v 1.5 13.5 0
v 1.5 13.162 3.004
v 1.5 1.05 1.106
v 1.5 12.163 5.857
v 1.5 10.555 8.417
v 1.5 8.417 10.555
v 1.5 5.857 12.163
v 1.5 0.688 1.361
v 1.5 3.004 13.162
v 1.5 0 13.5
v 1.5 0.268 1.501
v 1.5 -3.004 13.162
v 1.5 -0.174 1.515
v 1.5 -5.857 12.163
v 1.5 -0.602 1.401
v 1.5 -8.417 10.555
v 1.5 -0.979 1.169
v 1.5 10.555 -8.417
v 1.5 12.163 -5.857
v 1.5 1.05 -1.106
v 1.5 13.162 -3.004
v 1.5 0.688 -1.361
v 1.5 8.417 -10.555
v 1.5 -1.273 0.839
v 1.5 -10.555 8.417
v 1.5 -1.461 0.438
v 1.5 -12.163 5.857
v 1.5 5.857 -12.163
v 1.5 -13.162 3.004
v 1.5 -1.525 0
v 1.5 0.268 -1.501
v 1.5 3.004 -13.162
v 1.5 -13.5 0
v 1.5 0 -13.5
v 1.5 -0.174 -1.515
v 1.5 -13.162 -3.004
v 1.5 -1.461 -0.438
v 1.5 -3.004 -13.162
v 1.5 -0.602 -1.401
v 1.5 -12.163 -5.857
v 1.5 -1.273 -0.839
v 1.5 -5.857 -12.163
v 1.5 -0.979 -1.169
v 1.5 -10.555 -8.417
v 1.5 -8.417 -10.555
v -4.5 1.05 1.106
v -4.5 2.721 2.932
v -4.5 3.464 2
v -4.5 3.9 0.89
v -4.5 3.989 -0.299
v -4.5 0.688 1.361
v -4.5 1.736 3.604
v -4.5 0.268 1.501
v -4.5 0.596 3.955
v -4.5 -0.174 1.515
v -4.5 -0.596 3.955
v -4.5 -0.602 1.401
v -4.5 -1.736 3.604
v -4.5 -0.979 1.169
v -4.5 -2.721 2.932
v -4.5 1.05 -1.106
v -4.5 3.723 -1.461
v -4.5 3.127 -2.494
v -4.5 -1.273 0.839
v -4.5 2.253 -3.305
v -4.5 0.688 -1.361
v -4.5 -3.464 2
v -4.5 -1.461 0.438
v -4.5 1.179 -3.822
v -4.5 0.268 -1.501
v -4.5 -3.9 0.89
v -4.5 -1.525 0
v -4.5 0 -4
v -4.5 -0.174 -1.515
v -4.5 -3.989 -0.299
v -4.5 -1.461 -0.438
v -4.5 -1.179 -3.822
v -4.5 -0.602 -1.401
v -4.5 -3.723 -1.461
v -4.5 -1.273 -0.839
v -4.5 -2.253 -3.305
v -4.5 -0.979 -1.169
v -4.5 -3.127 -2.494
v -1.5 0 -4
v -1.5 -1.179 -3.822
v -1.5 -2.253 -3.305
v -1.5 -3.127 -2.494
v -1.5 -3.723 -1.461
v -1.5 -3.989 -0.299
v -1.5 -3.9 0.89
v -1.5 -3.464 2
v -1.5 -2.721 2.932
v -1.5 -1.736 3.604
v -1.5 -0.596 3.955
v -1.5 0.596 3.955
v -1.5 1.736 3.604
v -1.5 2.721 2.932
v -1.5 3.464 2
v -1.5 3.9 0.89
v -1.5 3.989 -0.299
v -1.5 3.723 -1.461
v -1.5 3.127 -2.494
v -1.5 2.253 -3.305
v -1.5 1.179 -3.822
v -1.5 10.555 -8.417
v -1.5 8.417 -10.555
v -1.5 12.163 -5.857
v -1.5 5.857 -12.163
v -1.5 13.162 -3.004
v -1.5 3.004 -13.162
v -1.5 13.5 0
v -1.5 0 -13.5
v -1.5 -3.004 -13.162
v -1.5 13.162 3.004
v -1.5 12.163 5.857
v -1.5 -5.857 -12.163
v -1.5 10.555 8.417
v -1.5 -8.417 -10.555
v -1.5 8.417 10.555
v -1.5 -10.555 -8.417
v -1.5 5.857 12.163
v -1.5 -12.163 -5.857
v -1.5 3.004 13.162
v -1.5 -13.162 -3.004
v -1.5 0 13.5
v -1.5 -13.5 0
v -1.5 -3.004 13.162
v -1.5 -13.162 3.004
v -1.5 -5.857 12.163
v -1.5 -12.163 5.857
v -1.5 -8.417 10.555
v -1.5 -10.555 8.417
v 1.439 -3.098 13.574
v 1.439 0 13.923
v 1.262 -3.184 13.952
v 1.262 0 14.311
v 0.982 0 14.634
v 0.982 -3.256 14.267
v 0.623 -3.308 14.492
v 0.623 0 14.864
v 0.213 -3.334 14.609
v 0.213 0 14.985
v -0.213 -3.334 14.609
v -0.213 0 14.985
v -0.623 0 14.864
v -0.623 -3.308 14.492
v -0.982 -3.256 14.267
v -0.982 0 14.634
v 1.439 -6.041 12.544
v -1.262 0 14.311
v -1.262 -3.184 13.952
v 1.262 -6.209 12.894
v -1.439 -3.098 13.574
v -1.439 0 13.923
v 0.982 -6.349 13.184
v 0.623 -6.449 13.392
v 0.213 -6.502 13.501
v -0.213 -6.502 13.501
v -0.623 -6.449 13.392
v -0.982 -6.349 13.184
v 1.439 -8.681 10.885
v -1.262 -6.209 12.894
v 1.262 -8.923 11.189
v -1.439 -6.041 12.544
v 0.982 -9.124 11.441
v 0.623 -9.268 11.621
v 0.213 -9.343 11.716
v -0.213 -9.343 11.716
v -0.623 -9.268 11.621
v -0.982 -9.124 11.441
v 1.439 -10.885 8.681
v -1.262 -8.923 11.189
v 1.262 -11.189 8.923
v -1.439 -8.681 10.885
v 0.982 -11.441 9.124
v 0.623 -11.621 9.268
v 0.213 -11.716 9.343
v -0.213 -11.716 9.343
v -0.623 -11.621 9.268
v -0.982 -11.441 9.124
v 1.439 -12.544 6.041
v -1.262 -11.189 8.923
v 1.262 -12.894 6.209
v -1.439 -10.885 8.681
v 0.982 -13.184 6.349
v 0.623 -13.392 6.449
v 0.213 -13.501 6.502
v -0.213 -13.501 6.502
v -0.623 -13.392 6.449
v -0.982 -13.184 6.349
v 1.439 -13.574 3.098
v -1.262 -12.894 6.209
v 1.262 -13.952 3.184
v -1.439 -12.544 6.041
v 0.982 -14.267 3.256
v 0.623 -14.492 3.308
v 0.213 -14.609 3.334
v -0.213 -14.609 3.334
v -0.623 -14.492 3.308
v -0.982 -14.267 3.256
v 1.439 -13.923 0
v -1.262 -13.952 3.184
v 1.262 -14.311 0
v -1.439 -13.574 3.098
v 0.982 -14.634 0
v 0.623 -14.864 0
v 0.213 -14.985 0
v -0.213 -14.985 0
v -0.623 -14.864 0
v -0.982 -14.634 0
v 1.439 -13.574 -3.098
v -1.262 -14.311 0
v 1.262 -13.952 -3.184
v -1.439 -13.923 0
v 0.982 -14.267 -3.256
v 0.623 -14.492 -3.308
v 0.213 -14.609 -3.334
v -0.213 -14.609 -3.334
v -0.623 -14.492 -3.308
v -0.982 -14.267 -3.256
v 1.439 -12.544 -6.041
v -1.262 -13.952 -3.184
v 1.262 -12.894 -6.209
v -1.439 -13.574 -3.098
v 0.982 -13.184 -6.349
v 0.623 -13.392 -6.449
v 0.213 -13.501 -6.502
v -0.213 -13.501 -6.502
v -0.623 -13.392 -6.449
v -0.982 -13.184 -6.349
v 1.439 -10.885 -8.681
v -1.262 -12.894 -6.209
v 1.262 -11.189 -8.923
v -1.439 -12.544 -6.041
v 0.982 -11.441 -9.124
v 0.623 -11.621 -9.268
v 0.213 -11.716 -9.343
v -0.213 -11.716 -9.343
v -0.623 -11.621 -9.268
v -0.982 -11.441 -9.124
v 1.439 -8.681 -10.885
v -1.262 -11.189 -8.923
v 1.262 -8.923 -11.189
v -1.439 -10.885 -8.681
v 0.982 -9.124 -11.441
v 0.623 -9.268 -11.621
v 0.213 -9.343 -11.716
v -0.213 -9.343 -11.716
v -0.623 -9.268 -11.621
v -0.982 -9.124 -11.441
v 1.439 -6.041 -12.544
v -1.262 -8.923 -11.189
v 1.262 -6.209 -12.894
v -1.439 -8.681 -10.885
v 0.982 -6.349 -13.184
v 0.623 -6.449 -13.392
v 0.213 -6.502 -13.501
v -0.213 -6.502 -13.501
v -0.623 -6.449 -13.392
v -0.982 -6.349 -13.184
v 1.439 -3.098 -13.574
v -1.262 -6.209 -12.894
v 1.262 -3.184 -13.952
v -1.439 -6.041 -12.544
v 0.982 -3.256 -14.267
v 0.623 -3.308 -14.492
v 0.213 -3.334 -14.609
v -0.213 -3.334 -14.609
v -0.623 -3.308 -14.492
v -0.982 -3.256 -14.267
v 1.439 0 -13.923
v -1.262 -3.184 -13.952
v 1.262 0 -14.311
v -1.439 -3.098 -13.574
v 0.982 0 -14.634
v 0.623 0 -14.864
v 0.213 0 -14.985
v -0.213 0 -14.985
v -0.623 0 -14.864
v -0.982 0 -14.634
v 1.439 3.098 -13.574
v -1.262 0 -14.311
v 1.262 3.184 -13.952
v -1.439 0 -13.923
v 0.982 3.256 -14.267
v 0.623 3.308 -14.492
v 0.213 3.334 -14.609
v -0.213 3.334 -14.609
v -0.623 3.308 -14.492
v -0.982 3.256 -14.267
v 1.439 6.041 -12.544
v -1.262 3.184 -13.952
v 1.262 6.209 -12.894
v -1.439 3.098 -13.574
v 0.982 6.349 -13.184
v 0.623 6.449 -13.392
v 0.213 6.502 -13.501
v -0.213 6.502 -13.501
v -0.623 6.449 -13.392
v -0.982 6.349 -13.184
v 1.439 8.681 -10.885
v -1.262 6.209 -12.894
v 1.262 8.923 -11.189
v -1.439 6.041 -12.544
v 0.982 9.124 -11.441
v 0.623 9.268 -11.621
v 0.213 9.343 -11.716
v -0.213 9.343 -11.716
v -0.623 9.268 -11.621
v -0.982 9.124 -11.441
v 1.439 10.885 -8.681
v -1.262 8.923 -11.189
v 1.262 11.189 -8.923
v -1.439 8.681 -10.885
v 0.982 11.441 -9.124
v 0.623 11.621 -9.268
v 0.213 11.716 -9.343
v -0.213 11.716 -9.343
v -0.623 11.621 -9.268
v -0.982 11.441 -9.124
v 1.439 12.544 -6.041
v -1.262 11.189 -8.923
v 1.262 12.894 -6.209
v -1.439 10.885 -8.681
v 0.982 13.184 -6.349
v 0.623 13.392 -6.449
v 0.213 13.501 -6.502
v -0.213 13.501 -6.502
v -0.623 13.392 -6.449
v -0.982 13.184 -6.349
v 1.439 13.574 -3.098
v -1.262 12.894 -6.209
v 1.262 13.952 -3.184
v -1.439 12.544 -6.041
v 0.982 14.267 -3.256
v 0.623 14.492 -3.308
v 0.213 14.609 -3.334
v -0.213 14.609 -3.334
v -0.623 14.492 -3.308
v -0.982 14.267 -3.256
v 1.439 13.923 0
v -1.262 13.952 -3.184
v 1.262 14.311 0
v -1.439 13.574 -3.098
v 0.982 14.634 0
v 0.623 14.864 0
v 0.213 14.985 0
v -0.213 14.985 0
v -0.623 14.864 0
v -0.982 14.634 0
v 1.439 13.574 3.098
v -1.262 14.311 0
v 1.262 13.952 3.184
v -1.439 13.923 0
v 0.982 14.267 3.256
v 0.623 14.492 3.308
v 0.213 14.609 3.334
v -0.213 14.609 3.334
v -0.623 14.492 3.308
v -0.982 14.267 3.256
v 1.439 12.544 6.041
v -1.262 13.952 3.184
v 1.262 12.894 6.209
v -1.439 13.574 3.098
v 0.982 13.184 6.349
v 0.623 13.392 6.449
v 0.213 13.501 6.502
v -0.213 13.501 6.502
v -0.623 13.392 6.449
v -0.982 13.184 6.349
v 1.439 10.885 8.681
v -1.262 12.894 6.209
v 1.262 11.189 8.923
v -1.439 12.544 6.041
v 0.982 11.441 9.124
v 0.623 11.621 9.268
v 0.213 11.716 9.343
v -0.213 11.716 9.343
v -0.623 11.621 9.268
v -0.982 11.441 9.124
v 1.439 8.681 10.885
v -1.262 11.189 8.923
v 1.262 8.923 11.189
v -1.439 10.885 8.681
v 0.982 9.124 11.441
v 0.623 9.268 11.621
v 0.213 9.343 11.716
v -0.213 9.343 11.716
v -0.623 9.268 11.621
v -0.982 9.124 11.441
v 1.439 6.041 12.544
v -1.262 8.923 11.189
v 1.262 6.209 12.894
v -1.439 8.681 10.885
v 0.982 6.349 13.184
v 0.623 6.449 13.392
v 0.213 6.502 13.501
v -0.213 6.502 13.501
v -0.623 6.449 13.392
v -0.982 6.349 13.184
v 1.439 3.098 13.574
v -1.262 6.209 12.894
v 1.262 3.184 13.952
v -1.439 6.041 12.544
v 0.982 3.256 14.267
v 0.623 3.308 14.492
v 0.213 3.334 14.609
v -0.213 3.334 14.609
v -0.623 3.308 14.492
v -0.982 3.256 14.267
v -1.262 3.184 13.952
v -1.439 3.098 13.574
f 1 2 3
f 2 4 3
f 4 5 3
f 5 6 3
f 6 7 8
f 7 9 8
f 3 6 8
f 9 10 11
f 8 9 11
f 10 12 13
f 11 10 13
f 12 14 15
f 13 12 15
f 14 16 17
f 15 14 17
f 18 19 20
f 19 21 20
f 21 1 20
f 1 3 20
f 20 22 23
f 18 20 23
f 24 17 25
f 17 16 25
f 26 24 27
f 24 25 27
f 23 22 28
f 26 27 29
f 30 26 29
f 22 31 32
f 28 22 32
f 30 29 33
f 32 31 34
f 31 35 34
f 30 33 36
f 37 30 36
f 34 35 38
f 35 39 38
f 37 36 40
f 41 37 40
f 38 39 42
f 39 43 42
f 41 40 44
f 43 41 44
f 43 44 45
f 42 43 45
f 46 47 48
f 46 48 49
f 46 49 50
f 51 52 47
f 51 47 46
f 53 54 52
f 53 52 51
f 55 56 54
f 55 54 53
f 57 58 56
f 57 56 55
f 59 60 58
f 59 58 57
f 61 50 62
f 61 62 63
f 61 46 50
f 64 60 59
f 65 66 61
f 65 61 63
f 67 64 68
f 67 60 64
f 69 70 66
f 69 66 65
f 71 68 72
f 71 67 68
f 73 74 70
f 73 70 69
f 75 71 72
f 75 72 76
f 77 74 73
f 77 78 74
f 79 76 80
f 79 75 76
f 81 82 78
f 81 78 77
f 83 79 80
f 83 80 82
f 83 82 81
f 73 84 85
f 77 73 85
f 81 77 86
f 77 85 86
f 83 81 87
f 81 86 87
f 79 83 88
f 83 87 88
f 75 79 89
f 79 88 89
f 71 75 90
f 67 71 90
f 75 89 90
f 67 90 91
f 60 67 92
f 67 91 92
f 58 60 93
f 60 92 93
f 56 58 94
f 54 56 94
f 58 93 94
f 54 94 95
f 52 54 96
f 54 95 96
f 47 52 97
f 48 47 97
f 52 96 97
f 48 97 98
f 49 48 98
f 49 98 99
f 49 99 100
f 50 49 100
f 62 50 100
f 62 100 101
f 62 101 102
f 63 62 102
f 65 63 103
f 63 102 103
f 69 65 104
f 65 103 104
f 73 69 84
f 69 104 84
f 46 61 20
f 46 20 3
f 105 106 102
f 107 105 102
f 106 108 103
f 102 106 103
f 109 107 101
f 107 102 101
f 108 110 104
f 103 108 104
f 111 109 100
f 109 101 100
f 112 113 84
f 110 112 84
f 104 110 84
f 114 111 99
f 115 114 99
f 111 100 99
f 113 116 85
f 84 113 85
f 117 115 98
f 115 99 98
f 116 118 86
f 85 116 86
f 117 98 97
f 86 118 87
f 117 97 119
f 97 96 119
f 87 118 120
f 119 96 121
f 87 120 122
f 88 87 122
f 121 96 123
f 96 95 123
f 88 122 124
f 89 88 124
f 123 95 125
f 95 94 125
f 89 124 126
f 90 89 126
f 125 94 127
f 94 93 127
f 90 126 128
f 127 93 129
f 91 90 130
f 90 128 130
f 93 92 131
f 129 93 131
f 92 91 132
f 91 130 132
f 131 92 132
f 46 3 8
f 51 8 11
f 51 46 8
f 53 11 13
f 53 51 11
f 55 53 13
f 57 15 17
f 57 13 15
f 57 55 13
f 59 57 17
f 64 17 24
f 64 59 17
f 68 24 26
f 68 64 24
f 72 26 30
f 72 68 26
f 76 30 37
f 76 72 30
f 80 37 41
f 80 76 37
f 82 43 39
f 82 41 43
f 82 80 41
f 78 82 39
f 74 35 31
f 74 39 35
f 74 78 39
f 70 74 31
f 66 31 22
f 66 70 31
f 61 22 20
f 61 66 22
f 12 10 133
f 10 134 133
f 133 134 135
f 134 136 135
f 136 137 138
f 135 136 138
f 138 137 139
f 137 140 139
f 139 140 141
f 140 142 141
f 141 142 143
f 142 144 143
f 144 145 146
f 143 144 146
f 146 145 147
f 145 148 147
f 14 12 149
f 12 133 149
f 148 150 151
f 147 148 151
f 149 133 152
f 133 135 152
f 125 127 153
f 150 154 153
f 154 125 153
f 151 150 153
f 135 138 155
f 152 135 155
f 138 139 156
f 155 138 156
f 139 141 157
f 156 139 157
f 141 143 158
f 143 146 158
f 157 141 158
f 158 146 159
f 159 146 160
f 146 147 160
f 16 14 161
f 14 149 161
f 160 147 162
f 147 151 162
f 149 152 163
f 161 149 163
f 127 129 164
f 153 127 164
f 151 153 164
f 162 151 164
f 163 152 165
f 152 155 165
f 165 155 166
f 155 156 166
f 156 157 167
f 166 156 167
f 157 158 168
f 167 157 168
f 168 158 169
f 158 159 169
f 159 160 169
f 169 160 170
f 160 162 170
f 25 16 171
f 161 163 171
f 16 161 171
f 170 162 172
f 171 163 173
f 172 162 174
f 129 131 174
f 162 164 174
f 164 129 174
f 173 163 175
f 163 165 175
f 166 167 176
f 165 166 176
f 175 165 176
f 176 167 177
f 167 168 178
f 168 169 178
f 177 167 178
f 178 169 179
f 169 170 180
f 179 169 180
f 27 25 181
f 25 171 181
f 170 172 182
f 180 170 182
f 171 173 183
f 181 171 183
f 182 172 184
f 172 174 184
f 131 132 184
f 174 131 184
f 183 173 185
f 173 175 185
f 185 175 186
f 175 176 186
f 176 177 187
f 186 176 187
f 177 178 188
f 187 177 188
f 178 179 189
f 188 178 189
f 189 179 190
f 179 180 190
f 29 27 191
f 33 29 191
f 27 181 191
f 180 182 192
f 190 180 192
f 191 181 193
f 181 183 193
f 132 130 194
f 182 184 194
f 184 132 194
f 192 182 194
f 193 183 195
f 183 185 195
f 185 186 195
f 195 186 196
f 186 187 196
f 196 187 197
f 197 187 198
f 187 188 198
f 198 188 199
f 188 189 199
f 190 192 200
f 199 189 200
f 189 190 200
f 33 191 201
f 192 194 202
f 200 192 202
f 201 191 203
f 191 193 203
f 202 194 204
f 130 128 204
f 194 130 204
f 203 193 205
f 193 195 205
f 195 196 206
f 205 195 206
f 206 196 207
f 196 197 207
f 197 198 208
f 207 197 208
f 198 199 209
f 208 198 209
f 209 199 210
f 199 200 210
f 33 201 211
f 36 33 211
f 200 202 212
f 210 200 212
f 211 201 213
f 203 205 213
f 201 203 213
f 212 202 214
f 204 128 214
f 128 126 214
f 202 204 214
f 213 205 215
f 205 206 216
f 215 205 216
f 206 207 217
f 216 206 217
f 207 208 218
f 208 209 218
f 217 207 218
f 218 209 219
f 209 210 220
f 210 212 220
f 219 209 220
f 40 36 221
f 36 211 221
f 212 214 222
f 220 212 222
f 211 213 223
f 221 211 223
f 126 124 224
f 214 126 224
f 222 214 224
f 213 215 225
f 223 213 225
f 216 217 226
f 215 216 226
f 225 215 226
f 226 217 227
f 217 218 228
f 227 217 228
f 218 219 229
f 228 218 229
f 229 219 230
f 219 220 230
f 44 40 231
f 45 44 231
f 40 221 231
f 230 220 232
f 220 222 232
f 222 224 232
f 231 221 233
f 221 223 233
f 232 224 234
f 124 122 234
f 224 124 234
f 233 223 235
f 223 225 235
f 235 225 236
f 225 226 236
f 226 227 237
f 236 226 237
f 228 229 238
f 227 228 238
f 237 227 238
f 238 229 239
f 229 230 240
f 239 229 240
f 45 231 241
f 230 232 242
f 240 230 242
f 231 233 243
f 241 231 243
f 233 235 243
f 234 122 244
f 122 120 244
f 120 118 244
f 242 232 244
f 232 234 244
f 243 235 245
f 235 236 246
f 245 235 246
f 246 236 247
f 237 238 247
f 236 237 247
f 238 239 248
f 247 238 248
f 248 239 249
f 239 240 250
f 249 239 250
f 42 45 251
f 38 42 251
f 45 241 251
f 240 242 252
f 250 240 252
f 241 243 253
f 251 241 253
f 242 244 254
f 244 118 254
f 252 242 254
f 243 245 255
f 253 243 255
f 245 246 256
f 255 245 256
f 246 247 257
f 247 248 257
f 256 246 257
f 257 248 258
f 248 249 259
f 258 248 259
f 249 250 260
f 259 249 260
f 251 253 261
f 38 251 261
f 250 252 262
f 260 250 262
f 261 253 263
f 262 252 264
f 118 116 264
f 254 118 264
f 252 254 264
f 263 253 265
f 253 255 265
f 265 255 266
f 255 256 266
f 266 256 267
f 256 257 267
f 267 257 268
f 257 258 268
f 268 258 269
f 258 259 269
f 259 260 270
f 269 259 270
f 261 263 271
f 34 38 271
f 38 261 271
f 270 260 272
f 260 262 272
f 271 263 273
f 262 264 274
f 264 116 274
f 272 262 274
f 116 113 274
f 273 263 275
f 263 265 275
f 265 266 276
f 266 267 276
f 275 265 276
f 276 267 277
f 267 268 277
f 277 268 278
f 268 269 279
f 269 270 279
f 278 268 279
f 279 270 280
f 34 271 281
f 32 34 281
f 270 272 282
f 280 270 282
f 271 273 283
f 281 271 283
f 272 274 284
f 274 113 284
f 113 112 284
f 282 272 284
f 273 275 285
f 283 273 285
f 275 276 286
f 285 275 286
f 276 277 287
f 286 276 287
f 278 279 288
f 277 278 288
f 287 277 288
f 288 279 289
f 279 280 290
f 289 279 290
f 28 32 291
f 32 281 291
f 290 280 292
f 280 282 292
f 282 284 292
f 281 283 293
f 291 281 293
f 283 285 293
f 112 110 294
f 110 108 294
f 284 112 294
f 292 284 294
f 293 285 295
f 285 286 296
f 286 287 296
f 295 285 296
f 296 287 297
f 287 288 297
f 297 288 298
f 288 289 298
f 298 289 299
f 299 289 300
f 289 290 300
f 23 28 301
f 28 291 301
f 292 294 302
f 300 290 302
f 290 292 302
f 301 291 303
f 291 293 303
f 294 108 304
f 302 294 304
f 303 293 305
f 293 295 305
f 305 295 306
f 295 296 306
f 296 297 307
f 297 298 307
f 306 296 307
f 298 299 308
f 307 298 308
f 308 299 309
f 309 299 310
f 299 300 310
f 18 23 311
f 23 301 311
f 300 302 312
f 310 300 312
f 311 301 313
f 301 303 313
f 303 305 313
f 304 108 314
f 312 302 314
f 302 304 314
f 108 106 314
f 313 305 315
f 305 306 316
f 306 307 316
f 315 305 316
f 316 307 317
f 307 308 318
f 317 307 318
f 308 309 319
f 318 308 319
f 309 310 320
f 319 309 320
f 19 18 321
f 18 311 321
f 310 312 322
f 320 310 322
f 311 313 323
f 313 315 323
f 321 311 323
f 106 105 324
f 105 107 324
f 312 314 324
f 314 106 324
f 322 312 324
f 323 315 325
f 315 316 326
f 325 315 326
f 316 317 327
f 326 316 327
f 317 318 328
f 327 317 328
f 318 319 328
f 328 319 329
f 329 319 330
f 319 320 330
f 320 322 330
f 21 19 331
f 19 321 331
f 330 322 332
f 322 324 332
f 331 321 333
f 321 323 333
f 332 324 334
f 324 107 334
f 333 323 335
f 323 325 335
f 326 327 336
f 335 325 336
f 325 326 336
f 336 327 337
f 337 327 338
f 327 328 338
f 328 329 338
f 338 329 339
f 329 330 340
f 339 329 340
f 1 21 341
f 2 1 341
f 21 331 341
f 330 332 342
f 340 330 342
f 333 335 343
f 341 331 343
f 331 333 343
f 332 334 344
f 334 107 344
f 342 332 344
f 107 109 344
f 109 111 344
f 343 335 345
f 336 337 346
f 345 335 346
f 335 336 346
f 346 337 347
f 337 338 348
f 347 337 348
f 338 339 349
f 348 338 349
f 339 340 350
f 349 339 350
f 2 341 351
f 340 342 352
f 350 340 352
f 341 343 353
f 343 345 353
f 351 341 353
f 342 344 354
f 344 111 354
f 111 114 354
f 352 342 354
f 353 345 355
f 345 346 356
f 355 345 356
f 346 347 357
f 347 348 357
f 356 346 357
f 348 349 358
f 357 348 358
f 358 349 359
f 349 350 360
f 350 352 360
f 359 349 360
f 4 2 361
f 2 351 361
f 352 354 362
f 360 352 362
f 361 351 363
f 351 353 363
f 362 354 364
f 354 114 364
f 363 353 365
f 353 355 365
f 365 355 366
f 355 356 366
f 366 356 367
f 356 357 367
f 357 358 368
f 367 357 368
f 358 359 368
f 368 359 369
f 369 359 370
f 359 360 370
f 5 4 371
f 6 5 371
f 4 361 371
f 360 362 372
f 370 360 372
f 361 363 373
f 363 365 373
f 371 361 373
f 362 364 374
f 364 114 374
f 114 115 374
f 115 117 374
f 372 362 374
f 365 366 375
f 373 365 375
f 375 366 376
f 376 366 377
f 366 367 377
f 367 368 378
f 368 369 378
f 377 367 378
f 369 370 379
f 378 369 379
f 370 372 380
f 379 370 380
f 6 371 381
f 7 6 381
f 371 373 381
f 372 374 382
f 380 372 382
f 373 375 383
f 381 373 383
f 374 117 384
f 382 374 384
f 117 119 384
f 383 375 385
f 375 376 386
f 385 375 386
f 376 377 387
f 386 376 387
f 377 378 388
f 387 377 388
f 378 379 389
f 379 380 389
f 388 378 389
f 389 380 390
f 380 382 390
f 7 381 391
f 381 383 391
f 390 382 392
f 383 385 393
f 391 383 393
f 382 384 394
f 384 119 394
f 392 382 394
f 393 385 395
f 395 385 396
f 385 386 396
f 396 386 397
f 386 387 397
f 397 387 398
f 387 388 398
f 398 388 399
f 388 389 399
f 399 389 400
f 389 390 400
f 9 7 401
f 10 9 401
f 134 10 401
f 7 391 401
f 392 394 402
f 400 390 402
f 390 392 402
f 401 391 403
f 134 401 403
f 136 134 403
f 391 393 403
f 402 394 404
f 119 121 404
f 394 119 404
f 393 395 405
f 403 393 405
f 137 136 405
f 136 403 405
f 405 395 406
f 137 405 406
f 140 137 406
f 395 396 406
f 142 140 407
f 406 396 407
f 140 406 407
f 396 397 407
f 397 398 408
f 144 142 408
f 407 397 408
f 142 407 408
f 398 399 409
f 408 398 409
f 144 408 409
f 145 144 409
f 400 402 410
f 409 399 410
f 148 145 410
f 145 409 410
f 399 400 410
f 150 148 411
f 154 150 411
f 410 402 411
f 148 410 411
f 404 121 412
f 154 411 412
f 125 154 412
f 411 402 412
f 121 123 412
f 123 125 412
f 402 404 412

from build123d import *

# Parameters (mm, degrees)
SKETCH_3_R          = 4
EXTRUDE_1_DEPTH     = 3
CUT_EXTRUDE_1_DEPTH = 23.045407821


with BuildPart() as part:
    # ｽｹｯﾁ2 → 回転1 (revolve)
    with BuildSketch(Plane.XY, mode=Mode.PRIVATE) as revolve_1_sk:
        with BuildLine():
            Line((-1.5, 13.5), (-1.5, 0))
            Line((-1.5, 0), (1.5, 0))
            Line((1.5, 0), (1.5, 13.5))
            ThreePointArc((1.5, 13.5), (0, 15), (-1.5, 13.5))
        make_face()
    revolve(revolve_1_sk.sketch.rotate(Axis((0, 0, 0), (1, 0, 0)), 90), axis=Axis((0, 0, 0), (1, 0, 0)))

    # ｽｹｯﾁ3 → ﾎﾞｽ - 押し出し1 (add)
    with BuildSketch(Plane.ZY.offset(1.5)):
        with Locations(Location((0, 0, 0), (0, 0, 180))):
            Circle(SKETCH_3_R)
    extrude(amount=EXTRUDE_1_DEPTH)

    # ｽｹｯﾁ4 → ｶｯﾄ - 押し出し1 (cut, through all)
    with BuildSketch(Plane.ZY.offset(4.5)):
        with BuildLine():
            Line((-1.105949818, 1.05), (1.105949818, 1.05))
            ThreePointArc((1.105949818, 1.05), (0, -1.525), (-1.105949818, 1.05))
        make_face()
    extrude(amount=-CUT_EXTRUDE_1_DEPTH, mode=Mode.SUBTRACT)


solid = part.part
